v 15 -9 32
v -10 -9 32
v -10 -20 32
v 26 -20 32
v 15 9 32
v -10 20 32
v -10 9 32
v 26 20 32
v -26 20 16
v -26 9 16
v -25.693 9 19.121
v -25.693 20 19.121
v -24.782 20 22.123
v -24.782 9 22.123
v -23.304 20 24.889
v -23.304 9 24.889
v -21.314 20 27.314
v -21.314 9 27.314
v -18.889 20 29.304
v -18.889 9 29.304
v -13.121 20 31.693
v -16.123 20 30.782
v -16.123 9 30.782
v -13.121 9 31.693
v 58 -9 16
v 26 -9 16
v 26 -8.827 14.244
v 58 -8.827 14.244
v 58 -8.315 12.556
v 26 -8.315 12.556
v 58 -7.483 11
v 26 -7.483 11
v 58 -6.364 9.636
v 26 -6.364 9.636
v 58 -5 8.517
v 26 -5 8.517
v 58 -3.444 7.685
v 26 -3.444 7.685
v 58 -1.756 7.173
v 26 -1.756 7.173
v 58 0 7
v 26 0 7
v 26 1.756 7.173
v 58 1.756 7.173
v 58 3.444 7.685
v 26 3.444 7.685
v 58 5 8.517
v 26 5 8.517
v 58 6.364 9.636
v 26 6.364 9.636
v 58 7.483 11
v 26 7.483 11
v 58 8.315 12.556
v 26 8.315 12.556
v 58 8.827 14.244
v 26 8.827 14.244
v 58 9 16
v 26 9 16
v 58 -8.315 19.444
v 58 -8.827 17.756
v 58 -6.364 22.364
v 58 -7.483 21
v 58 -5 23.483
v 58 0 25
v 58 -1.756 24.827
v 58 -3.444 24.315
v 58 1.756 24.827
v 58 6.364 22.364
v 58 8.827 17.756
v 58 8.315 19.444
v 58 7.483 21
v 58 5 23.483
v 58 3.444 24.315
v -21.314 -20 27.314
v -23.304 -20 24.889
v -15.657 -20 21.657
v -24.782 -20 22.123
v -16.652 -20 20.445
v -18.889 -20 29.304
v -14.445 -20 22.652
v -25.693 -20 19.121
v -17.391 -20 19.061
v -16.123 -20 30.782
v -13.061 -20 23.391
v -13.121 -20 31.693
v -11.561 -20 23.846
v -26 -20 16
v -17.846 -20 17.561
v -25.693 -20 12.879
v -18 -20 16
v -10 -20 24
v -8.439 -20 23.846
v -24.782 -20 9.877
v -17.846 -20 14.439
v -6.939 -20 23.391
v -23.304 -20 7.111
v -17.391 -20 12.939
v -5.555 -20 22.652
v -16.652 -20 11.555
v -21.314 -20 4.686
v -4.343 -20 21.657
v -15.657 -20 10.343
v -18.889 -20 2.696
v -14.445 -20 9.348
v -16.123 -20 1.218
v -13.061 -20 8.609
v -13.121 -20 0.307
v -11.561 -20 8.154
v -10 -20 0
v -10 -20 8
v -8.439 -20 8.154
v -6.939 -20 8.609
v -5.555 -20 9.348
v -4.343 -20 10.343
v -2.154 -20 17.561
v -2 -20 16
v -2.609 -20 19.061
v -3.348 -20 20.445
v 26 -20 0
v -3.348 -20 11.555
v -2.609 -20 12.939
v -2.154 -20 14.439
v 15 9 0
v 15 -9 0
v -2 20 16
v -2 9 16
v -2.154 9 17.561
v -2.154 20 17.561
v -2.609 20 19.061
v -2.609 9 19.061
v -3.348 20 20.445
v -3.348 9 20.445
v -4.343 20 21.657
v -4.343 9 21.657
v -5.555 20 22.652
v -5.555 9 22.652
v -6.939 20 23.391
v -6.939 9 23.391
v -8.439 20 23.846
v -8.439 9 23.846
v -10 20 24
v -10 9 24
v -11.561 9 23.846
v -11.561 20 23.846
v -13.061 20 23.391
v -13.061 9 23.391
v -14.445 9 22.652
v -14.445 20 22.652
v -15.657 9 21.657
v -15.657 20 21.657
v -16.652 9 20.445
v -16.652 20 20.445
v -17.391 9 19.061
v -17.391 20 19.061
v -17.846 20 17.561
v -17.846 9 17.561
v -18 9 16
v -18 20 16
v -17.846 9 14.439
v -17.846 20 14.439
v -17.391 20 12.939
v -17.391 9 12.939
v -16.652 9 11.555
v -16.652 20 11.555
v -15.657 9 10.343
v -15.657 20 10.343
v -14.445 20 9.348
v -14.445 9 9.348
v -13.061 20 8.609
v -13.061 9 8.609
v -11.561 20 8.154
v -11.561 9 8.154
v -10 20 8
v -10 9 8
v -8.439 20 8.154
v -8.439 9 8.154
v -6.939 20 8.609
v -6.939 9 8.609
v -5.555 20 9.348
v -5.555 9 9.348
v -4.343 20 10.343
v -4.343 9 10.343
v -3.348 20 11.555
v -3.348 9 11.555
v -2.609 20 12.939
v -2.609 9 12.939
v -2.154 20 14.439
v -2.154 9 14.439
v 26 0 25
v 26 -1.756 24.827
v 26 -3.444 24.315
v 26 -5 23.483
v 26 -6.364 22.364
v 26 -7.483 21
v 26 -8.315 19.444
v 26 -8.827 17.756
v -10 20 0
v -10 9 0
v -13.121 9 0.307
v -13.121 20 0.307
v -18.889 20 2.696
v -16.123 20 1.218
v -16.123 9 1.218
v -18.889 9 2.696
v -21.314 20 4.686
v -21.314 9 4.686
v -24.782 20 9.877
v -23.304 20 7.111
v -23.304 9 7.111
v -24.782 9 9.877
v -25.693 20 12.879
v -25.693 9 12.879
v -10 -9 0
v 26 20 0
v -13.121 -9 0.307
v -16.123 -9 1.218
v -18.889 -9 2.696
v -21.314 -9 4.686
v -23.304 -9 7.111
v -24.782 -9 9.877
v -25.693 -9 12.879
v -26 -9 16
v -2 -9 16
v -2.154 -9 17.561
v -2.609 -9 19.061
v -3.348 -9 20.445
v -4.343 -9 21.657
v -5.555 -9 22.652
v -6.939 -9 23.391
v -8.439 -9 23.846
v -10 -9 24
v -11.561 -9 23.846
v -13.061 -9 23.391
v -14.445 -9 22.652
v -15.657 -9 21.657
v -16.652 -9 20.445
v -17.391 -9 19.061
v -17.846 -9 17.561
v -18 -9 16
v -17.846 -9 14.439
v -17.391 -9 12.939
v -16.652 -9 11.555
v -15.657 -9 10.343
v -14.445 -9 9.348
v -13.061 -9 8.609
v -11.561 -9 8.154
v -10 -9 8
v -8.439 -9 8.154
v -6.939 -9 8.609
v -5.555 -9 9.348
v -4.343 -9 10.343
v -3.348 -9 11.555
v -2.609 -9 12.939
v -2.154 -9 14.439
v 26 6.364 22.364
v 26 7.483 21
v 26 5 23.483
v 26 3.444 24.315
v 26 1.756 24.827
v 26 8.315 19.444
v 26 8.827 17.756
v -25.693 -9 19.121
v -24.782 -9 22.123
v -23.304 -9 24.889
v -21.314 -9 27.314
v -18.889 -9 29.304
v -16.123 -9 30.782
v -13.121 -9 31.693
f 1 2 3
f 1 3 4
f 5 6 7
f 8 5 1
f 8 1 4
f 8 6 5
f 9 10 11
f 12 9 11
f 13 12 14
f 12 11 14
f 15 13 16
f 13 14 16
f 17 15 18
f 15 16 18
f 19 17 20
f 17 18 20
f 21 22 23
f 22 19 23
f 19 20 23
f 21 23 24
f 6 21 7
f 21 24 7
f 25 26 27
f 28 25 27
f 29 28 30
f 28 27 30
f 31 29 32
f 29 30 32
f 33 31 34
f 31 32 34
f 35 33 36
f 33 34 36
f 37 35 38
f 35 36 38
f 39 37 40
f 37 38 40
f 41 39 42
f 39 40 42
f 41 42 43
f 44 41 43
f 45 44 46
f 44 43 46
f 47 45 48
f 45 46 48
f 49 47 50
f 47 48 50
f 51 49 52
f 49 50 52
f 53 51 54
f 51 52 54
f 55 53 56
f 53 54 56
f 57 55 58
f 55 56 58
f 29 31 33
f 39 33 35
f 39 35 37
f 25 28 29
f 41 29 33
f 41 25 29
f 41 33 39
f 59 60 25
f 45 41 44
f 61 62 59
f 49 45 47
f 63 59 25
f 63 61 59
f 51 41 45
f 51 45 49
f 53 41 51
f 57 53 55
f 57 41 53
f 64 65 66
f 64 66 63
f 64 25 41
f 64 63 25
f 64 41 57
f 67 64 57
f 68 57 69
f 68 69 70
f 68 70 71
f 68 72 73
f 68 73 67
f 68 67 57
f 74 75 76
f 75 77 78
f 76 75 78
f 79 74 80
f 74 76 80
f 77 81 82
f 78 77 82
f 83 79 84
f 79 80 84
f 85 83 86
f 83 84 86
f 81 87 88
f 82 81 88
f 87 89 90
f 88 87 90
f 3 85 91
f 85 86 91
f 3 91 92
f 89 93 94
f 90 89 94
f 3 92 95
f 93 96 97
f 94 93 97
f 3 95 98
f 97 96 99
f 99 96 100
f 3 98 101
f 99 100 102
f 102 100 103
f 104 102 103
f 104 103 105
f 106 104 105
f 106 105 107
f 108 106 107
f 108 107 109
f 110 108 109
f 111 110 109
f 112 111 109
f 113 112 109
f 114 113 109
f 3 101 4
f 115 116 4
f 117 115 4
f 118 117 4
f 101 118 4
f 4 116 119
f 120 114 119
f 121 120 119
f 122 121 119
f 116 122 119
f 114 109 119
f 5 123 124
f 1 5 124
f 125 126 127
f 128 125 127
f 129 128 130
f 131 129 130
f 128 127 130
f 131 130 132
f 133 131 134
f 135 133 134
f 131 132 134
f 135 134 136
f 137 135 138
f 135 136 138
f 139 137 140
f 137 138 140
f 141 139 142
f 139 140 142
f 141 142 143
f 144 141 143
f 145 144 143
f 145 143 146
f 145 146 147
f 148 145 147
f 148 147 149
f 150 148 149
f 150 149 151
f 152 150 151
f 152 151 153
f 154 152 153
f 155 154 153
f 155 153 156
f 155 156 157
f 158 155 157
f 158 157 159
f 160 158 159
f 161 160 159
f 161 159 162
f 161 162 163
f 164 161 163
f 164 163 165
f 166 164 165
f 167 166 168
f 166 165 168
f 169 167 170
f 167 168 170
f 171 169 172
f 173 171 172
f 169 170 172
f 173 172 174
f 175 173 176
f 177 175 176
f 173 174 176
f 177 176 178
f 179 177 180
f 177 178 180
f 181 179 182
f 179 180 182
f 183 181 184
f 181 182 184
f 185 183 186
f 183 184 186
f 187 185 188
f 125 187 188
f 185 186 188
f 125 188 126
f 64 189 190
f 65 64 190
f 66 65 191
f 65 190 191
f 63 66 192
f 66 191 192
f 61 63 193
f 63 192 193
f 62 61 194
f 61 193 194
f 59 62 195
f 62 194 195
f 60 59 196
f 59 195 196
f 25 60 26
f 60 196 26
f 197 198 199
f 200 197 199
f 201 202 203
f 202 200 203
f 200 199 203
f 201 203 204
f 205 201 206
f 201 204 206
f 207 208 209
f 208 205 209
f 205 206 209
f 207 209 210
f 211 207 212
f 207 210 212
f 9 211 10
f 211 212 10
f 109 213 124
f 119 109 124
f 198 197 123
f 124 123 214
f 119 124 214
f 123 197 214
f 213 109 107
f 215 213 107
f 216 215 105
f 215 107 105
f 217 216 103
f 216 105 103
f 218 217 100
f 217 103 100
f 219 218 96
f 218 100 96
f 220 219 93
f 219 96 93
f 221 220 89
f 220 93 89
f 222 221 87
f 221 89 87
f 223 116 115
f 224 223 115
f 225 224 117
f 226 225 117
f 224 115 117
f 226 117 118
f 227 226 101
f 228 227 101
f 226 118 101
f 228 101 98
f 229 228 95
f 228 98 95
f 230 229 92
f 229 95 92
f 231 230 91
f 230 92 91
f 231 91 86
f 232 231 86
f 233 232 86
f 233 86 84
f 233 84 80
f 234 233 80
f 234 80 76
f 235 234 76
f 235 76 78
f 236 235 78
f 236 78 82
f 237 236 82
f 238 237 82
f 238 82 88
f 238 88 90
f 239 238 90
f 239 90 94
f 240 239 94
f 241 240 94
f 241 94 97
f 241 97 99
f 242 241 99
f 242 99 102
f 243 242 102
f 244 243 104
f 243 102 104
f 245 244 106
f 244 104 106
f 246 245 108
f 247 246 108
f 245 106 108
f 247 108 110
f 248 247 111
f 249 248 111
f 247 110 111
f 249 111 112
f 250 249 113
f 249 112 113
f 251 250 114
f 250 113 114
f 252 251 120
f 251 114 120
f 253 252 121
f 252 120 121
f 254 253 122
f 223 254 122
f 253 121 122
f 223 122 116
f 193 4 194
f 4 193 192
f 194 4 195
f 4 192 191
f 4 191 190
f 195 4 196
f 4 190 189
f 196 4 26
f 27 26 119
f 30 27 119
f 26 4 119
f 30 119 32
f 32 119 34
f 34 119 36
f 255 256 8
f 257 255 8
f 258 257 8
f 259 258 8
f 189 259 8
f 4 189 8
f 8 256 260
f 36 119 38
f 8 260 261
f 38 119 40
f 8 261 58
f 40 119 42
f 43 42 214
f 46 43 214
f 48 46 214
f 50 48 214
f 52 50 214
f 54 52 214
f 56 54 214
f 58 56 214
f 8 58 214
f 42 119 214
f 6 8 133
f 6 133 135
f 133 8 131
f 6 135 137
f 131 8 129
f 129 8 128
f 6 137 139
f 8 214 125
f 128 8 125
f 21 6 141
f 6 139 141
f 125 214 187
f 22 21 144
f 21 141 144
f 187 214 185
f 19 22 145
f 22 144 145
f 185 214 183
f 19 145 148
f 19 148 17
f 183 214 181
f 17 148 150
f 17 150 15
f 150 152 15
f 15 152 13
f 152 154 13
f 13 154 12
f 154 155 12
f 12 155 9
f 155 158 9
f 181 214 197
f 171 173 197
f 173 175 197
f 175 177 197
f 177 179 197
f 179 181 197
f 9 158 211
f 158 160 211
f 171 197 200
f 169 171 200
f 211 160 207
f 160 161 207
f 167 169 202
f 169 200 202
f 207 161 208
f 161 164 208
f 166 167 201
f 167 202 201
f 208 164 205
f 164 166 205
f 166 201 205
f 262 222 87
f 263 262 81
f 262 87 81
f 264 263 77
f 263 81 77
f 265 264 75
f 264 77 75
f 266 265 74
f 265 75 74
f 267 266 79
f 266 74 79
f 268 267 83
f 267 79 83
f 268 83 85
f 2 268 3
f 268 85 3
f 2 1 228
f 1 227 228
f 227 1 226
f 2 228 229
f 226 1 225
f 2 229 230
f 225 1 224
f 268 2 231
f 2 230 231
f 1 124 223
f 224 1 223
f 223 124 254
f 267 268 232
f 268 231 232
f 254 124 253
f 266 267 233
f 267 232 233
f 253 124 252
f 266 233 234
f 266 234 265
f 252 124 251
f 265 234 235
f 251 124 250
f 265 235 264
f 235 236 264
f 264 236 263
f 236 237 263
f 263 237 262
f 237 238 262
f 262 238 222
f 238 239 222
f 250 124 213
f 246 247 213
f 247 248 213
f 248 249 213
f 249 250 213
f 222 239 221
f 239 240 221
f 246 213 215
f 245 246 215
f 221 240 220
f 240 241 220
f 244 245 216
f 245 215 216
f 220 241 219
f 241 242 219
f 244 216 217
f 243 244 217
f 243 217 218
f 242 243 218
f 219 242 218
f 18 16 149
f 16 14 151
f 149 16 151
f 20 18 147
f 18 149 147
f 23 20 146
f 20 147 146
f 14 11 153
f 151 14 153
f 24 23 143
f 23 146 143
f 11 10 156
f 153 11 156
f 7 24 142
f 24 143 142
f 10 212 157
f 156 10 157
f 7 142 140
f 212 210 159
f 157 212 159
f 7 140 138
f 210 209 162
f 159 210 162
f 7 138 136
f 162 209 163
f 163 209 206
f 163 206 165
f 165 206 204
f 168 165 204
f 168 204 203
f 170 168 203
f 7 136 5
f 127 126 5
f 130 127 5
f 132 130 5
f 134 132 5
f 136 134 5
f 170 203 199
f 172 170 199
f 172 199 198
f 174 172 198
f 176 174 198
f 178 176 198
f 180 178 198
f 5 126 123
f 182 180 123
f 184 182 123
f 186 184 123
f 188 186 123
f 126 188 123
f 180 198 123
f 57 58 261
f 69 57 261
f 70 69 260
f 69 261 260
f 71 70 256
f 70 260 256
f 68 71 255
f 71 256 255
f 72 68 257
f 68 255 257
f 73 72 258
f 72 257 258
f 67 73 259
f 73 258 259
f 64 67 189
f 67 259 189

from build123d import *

# Parameters (mm, degrees)
F1_DEPTH = 32
F2_R     = 8
F3_DEPTH = 99.3
F5_DEPTH = 32


with BuildPart() as f1:
    # F0 (on Top) → F1 (new body)
    with BuildSketch(Plane.XY):
        Polygon((26, 9), (26, 20), (-26, 20), (-26, 9), (15, 9), (15, -9), (-26, -9), (-26, -20), (26, -20), (26, -9), align=None)
    extrude(amount=F1_DEPTH)

    # F2 (on face) → F3 (cut)
    with BuildSketch(Plane.XZ.offset(20)):
        with BuildLine():
            ThreePointArc((-26, 16.000000143), (-21.3137084484, 27.3137085495), (-10, 32))
            Line((-10, 32), (-26, 32))
            Line((-26, 32), (-26, 16.000000143))
        make_face()
        with BuildLine():
            Line((-26, 0), (-10, 0))
            ThreePointArc((-10, 0), (-21.3137085495, 4.6862915516), (-26, 16.000000143))
            Line((-26, 16.000000143), (-26, 0))
        make_face()
        with Locations((-10, 16)):
            Circle(F2_R)
    extrude(amount=-F3_DEPTH, mode=Mode.SUBTRACT)

    # F4 (on face) → F5 (join)
    with BuildSketch(Plane.YZ.offset(26)):
        with BuildLine():
            ThreePointArc((9, 16), (6.3639610307, 22.3639610307), (0, 25))
            Line((0, 25), (0, 16))
            Line((0, 16), (9, 16))
        make_face()
        with BuildLine():
            Line((0, 16), (0, 25))
            ThreePointArc((0, 25), (-6.3639610307, 22.3639610307), (-9, 16))
            Line((-9, 16), (0, 16))
        make_face()
        with BuildLine():
            Line((9, 16), (0, 16))
            Line((0, 16), (0, 7))
            ThreePointArc((0, 7), (6.3639610307, 9.6360389693), (9, 16))
        make_face()
        with BuildLine():
            Line((0, 7), (0, 16))
            Line((0, 16), (-9, 16))
            ThreePointArc((-9, 16), (-6.3639610307, 9.6360389693), (0, 7))
        make_face()
    extrude(amount=F5_DEPTH)


solid = f1.part
